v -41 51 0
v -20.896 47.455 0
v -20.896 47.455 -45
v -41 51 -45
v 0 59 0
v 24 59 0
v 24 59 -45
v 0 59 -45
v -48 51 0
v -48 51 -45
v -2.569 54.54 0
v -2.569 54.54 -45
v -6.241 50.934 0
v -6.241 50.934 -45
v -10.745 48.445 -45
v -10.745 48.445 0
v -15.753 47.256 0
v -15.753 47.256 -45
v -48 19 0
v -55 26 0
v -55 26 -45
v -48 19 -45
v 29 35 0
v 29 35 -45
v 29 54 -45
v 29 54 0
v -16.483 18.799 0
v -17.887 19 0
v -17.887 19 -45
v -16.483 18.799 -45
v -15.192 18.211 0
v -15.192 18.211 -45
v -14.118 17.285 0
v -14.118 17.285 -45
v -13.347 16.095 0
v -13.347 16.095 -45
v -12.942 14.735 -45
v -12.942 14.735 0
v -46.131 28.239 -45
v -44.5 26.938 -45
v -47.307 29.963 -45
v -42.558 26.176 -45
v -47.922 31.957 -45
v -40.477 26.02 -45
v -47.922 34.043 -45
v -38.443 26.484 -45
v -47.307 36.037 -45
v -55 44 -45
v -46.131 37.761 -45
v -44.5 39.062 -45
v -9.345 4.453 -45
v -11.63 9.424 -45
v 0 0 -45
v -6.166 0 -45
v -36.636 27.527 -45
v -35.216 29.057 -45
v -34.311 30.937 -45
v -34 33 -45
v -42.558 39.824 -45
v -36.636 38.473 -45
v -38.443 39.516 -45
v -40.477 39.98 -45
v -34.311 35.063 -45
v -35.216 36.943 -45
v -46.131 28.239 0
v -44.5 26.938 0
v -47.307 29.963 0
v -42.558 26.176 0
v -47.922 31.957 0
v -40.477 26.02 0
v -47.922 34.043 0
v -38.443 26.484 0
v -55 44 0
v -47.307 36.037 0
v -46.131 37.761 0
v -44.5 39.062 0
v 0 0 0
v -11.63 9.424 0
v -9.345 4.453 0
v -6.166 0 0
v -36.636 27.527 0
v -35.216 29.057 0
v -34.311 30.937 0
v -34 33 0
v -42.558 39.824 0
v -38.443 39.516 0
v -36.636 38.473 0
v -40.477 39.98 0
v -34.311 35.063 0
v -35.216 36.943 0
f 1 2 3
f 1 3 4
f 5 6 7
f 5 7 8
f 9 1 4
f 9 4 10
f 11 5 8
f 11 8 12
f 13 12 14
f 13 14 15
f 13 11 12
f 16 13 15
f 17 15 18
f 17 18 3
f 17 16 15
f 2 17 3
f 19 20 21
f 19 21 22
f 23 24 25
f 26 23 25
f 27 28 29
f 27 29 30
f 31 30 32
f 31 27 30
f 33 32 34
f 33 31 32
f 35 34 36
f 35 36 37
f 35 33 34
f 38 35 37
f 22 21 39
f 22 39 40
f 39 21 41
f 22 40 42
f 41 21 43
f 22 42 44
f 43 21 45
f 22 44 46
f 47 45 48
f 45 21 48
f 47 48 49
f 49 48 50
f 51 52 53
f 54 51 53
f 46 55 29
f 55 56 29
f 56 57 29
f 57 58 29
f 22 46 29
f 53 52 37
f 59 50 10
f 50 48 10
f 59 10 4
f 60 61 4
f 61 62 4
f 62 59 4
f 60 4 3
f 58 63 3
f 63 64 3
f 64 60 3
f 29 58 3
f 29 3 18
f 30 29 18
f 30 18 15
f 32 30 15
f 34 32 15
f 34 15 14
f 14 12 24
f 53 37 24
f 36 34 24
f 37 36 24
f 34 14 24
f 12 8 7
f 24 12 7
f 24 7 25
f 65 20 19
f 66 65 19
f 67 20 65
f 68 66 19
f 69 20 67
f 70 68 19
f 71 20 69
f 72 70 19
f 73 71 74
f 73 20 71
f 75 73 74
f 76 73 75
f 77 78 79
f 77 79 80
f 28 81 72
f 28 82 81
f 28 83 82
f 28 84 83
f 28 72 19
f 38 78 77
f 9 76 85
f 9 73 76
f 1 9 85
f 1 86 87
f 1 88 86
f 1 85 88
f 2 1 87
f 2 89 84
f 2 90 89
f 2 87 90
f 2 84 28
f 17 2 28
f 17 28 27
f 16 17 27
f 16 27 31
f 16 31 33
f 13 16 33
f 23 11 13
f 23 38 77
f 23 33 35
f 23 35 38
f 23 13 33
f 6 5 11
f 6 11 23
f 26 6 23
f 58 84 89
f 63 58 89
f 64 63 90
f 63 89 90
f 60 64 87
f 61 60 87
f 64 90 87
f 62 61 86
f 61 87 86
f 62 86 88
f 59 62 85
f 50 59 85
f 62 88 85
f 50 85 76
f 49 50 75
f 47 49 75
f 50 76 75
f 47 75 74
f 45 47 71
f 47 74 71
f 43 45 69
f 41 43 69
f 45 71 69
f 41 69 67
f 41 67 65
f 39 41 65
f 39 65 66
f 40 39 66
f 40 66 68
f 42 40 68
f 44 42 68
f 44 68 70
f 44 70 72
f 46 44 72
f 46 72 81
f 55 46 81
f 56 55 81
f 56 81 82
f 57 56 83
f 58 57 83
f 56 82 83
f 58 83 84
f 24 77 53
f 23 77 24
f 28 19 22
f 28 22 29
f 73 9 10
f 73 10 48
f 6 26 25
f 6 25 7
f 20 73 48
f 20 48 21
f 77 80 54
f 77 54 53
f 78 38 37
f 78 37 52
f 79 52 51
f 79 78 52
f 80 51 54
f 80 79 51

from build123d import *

# Parameters (mm, degrees)
ESQUISSE1_R        = 7
BOSS_EXTRU_1_DEPTH = 45


with BuildPart() as part:
    # Esquisse1 → Boss.-Extru.1 (new body)
    with BuildSketch(Plane.XY):
        with BuildLine():
            Line((0, 0), (29, 35))
            Line((29, 35), (29, 54))
            Line((29, 54), (24, 59))
            Line((24, 59), (0, 59))
            ThreePointArc((0, 59), (-8.408362672, 49.535902458), (-20.895957648, 47.455114912))
            Line((-20.895957648, 47.455114912), (-41, 51))
            Line((-41, 51), (-48, 51))
            Line((-48, 51), (-55, 44))
            Line((-55, 44), (-55, 26))
            Line((-55, 26), (-48, 19))
            Line((-48, 19), (-17.887486299, 19))
            ThreePointArc((-17.887486299, 19), (-14.622250518, 17.786586232), (-12.941847557, 14.735294118))
            ThreePointArc((-12.941847557, 14.735294118), (-10.605017354, 6.884327939), (-6.166045157, 0))
            Line((-6.166045157, 0), (0, 0))
        make_face()
        with Locations((-41, 33)):
            Circle(ESQUISSE1_R, mode=Mode.SUBTRACT)
    extrude(amount=-BOSS_EXTRU_1_DEPTH)


solid = part.part
